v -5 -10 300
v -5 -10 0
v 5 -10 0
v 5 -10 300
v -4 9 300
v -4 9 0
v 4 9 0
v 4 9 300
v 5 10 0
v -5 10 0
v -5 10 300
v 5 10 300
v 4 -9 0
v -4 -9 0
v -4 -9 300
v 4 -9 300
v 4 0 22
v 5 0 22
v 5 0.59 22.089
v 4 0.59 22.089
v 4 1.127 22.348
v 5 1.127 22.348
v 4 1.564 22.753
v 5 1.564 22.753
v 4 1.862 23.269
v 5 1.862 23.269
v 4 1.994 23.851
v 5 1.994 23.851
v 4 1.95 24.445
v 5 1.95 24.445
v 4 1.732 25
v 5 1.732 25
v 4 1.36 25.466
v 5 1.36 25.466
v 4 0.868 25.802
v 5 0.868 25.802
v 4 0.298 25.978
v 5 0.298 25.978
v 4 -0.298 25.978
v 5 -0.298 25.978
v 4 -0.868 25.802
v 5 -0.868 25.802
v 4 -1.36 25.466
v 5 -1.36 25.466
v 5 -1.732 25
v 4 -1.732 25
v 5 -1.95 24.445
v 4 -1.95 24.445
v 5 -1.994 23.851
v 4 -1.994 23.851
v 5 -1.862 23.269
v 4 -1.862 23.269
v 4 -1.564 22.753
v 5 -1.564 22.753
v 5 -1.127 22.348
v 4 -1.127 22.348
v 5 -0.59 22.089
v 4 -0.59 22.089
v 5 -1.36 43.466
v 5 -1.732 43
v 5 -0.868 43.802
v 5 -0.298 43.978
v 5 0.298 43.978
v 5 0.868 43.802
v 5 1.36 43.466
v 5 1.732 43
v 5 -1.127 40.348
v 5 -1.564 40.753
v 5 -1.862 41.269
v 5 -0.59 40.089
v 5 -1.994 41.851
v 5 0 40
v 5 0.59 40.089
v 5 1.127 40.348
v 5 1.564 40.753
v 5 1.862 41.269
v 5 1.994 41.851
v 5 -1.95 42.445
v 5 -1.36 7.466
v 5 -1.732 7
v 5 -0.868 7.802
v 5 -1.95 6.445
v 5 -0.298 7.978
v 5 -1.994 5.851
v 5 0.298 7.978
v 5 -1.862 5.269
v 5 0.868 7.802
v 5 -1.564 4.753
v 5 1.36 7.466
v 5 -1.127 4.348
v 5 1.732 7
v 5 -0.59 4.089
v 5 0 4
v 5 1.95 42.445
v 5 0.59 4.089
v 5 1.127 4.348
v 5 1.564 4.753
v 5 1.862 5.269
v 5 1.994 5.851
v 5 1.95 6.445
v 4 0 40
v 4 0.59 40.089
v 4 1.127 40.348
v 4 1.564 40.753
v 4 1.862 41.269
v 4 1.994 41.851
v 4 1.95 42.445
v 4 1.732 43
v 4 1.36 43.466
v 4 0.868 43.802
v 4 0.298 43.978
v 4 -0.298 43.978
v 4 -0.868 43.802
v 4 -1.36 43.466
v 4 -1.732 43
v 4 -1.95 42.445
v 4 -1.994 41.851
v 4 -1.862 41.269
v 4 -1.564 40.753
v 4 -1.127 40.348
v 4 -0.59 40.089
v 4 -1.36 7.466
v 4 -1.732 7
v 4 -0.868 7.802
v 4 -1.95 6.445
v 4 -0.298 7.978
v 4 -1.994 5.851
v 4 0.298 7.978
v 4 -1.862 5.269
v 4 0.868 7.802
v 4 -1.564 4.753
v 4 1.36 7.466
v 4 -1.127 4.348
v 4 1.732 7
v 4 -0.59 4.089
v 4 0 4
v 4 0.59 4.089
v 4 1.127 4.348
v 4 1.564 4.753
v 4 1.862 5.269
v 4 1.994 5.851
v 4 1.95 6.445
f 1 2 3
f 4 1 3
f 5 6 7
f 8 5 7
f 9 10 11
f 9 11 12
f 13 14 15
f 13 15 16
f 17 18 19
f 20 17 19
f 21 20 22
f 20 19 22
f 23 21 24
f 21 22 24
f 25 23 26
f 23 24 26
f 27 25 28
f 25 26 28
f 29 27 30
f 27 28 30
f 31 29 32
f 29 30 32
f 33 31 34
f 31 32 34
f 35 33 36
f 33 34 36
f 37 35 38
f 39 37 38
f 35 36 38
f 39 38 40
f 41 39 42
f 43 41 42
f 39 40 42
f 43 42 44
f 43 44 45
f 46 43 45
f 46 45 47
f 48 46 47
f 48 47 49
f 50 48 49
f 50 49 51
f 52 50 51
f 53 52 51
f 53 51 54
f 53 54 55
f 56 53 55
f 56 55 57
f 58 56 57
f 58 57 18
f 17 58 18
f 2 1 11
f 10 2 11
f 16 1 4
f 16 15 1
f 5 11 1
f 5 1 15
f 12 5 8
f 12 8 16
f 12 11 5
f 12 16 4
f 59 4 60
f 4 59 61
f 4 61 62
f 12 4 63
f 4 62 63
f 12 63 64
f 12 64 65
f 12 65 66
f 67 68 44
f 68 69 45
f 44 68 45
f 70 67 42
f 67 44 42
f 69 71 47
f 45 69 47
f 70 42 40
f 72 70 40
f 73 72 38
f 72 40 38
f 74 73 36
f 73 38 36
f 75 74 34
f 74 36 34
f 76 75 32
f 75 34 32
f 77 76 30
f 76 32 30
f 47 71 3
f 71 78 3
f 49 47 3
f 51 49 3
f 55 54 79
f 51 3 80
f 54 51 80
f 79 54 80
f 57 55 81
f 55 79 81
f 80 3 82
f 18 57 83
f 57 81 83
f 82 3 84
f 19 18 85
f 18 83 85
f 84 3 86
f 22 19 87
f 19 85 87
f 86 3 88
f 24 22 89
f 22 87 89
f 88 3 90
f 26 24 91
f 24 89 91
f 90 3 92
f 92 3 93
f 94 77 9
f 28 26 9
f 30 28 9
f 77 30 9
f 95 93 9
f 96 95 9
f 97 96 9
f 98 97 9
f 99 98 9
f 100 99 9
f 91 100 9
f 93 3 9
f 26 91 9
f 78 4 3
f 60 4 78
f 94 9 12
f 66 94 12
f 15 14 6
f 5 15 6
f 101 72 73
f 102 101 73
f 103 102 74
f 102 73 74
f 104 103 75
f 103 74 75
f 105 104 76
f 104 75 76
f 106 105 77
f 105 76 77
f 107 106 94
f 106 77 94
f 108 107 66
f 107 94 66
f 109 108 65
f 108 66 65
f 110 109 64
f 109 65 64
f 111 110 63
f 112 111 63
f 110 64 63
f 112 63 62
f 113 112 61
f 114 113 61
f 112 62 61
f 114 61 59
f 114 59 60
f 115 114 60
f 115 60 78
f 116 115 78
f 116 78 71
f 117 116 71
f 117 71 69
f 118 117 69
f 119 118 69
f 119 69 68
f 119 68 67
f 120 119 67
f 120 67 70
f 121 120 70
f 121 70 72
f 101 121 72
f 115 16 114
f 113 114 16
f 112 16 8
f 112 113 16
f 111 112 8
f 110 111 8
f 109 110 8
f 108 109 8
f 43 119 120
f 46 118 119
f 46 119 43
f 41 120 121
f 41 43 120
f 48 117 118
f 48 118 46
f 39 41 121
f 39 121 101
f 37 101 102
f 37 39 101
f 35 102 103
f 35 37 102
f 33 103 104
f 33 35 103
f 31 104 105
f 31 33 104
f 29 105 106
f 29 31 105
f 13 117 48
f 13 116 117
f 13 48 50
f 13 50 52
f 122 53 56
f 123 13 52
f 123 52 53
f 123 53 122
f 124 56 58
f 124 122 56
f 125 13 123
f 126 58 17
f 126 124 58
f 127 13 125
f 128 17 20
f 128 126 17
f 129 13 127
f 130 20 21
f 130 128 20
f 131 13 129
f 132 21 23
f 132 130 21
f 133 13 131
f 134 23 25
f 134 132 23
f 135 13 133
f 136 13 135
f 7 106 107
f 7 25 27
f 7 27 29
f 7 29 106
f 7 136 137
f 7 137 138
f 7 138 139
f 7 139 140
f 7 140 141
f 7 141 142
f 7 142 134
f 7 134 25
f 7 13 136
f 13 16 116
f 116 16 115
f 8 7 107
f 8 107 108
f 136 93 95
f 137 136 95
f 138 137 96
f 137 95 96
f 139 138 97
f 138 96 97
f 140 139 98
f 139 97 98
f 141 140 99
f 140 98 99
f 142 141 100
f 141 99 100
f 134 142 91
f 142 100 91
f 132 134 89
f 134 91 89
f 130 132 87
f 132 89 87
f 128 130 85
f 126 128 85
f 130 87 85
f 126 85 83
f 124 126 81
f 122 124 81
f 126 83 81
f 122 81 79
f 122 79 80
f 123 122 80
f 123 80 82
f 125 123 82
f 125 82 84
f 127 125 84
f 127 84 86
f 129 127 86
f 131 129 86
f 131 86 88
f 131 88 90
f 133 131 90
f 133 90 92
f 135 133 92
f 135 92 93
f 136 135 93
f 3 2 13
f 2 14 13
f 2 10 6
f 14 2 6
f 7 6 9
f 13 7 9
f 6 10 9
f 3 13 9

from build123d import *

# Parameters (mm, degrees)
SKETCH1_W           = 10
SKETCH1_H           = 20
SKETCH1_W_2         = 8
SKETCH1_H_2         = 18
BOSS_EXTRUDE1_DEPTH = 300
CUT_EXTRUDE1_REACH  = 302.333
SKETCH2_R           = 2


with BuildPart() as part:
    # Sketch1 → Boss-Extrude1 (new body)
    with BuildSketch(Plane.XY):
        Rectangle(SKETCH1_W, SKETCH1_H)
        Rectangle(SKETCH1_W_2, SKETCH1_H_2, mode=Mode.SUBTRACT)
    extrude(amount=BOSS_EXTRUDE1_DEPTH)

    # Sketch2 → Cut-Extrude1 (cut, up to next)
    with BuildSketch(Plane(origin=(5, 0, 0), x_dir=(0, 0, -1), z_dir=(1, 0, 0)), mode=Mode.PRIVATE) as cut_extrude1_sk1:
        with Locations((-6, 0)):
            Circle(SKETCH2_R)
    cut_extrude1_tool1 = extrude(cut_extrude1_sk1.sketch, amount=-CUT_EXTRUDE1_REACH, mode=Mode.PRIVATE) & part.part
    # Sketch2 → Cut-Extrude1 (cut, up to next)
    with BuildSketch(Plane(origin=(5, 0, 0), x_dir=(0, 0, -1), z_dir=(1, 0, 0)), mode=Mode.PRIVATE) as cut_extrude1_sk2:
        with Locations((-24, 0)):
            Circle(SKETCH2_R)
    cut_extrude1_tool2 = extrude(cut_extrude1_sk2.sketch, amount=-CUT_EXTRUDE1_REACH, mode=Mode.PRIVATE) & part.part
    # Sketch2 → Cut-Extrude1 (cut, up to next)
    with BuildSketch(Plane(origin=(5, 0, 0), x_dir=(0, 0, -1), z_dir=(1, 0, 0)), mode=Mode.PRIVATE) as cut_extrude1_sk3:
        with Locations((-42, 0)):
            Circle(SKETCH2_R)
    cut_extrude1_tool3 = extrude(cut_extrude1_sk3.sketch, amount=-CUT_EXTRUDE1_REACH, mode=Mode.PRIVATE) & part.part
    add(cut_extrude1_tool1.solids().sort_by_distance((5, 0, 6))[0], mode=Mode.SUBTRACT)
    add(cut_extrude1_tool2.solids().sort_by_distance((5, 0, 24))[0], mode=Mode.SUBTRACT)
    add(cut_extrude1_tool3.solids().sort_by_distance((5, 0, 42))[0], mode=Mode.SUBTRACT)


solid = part.part
